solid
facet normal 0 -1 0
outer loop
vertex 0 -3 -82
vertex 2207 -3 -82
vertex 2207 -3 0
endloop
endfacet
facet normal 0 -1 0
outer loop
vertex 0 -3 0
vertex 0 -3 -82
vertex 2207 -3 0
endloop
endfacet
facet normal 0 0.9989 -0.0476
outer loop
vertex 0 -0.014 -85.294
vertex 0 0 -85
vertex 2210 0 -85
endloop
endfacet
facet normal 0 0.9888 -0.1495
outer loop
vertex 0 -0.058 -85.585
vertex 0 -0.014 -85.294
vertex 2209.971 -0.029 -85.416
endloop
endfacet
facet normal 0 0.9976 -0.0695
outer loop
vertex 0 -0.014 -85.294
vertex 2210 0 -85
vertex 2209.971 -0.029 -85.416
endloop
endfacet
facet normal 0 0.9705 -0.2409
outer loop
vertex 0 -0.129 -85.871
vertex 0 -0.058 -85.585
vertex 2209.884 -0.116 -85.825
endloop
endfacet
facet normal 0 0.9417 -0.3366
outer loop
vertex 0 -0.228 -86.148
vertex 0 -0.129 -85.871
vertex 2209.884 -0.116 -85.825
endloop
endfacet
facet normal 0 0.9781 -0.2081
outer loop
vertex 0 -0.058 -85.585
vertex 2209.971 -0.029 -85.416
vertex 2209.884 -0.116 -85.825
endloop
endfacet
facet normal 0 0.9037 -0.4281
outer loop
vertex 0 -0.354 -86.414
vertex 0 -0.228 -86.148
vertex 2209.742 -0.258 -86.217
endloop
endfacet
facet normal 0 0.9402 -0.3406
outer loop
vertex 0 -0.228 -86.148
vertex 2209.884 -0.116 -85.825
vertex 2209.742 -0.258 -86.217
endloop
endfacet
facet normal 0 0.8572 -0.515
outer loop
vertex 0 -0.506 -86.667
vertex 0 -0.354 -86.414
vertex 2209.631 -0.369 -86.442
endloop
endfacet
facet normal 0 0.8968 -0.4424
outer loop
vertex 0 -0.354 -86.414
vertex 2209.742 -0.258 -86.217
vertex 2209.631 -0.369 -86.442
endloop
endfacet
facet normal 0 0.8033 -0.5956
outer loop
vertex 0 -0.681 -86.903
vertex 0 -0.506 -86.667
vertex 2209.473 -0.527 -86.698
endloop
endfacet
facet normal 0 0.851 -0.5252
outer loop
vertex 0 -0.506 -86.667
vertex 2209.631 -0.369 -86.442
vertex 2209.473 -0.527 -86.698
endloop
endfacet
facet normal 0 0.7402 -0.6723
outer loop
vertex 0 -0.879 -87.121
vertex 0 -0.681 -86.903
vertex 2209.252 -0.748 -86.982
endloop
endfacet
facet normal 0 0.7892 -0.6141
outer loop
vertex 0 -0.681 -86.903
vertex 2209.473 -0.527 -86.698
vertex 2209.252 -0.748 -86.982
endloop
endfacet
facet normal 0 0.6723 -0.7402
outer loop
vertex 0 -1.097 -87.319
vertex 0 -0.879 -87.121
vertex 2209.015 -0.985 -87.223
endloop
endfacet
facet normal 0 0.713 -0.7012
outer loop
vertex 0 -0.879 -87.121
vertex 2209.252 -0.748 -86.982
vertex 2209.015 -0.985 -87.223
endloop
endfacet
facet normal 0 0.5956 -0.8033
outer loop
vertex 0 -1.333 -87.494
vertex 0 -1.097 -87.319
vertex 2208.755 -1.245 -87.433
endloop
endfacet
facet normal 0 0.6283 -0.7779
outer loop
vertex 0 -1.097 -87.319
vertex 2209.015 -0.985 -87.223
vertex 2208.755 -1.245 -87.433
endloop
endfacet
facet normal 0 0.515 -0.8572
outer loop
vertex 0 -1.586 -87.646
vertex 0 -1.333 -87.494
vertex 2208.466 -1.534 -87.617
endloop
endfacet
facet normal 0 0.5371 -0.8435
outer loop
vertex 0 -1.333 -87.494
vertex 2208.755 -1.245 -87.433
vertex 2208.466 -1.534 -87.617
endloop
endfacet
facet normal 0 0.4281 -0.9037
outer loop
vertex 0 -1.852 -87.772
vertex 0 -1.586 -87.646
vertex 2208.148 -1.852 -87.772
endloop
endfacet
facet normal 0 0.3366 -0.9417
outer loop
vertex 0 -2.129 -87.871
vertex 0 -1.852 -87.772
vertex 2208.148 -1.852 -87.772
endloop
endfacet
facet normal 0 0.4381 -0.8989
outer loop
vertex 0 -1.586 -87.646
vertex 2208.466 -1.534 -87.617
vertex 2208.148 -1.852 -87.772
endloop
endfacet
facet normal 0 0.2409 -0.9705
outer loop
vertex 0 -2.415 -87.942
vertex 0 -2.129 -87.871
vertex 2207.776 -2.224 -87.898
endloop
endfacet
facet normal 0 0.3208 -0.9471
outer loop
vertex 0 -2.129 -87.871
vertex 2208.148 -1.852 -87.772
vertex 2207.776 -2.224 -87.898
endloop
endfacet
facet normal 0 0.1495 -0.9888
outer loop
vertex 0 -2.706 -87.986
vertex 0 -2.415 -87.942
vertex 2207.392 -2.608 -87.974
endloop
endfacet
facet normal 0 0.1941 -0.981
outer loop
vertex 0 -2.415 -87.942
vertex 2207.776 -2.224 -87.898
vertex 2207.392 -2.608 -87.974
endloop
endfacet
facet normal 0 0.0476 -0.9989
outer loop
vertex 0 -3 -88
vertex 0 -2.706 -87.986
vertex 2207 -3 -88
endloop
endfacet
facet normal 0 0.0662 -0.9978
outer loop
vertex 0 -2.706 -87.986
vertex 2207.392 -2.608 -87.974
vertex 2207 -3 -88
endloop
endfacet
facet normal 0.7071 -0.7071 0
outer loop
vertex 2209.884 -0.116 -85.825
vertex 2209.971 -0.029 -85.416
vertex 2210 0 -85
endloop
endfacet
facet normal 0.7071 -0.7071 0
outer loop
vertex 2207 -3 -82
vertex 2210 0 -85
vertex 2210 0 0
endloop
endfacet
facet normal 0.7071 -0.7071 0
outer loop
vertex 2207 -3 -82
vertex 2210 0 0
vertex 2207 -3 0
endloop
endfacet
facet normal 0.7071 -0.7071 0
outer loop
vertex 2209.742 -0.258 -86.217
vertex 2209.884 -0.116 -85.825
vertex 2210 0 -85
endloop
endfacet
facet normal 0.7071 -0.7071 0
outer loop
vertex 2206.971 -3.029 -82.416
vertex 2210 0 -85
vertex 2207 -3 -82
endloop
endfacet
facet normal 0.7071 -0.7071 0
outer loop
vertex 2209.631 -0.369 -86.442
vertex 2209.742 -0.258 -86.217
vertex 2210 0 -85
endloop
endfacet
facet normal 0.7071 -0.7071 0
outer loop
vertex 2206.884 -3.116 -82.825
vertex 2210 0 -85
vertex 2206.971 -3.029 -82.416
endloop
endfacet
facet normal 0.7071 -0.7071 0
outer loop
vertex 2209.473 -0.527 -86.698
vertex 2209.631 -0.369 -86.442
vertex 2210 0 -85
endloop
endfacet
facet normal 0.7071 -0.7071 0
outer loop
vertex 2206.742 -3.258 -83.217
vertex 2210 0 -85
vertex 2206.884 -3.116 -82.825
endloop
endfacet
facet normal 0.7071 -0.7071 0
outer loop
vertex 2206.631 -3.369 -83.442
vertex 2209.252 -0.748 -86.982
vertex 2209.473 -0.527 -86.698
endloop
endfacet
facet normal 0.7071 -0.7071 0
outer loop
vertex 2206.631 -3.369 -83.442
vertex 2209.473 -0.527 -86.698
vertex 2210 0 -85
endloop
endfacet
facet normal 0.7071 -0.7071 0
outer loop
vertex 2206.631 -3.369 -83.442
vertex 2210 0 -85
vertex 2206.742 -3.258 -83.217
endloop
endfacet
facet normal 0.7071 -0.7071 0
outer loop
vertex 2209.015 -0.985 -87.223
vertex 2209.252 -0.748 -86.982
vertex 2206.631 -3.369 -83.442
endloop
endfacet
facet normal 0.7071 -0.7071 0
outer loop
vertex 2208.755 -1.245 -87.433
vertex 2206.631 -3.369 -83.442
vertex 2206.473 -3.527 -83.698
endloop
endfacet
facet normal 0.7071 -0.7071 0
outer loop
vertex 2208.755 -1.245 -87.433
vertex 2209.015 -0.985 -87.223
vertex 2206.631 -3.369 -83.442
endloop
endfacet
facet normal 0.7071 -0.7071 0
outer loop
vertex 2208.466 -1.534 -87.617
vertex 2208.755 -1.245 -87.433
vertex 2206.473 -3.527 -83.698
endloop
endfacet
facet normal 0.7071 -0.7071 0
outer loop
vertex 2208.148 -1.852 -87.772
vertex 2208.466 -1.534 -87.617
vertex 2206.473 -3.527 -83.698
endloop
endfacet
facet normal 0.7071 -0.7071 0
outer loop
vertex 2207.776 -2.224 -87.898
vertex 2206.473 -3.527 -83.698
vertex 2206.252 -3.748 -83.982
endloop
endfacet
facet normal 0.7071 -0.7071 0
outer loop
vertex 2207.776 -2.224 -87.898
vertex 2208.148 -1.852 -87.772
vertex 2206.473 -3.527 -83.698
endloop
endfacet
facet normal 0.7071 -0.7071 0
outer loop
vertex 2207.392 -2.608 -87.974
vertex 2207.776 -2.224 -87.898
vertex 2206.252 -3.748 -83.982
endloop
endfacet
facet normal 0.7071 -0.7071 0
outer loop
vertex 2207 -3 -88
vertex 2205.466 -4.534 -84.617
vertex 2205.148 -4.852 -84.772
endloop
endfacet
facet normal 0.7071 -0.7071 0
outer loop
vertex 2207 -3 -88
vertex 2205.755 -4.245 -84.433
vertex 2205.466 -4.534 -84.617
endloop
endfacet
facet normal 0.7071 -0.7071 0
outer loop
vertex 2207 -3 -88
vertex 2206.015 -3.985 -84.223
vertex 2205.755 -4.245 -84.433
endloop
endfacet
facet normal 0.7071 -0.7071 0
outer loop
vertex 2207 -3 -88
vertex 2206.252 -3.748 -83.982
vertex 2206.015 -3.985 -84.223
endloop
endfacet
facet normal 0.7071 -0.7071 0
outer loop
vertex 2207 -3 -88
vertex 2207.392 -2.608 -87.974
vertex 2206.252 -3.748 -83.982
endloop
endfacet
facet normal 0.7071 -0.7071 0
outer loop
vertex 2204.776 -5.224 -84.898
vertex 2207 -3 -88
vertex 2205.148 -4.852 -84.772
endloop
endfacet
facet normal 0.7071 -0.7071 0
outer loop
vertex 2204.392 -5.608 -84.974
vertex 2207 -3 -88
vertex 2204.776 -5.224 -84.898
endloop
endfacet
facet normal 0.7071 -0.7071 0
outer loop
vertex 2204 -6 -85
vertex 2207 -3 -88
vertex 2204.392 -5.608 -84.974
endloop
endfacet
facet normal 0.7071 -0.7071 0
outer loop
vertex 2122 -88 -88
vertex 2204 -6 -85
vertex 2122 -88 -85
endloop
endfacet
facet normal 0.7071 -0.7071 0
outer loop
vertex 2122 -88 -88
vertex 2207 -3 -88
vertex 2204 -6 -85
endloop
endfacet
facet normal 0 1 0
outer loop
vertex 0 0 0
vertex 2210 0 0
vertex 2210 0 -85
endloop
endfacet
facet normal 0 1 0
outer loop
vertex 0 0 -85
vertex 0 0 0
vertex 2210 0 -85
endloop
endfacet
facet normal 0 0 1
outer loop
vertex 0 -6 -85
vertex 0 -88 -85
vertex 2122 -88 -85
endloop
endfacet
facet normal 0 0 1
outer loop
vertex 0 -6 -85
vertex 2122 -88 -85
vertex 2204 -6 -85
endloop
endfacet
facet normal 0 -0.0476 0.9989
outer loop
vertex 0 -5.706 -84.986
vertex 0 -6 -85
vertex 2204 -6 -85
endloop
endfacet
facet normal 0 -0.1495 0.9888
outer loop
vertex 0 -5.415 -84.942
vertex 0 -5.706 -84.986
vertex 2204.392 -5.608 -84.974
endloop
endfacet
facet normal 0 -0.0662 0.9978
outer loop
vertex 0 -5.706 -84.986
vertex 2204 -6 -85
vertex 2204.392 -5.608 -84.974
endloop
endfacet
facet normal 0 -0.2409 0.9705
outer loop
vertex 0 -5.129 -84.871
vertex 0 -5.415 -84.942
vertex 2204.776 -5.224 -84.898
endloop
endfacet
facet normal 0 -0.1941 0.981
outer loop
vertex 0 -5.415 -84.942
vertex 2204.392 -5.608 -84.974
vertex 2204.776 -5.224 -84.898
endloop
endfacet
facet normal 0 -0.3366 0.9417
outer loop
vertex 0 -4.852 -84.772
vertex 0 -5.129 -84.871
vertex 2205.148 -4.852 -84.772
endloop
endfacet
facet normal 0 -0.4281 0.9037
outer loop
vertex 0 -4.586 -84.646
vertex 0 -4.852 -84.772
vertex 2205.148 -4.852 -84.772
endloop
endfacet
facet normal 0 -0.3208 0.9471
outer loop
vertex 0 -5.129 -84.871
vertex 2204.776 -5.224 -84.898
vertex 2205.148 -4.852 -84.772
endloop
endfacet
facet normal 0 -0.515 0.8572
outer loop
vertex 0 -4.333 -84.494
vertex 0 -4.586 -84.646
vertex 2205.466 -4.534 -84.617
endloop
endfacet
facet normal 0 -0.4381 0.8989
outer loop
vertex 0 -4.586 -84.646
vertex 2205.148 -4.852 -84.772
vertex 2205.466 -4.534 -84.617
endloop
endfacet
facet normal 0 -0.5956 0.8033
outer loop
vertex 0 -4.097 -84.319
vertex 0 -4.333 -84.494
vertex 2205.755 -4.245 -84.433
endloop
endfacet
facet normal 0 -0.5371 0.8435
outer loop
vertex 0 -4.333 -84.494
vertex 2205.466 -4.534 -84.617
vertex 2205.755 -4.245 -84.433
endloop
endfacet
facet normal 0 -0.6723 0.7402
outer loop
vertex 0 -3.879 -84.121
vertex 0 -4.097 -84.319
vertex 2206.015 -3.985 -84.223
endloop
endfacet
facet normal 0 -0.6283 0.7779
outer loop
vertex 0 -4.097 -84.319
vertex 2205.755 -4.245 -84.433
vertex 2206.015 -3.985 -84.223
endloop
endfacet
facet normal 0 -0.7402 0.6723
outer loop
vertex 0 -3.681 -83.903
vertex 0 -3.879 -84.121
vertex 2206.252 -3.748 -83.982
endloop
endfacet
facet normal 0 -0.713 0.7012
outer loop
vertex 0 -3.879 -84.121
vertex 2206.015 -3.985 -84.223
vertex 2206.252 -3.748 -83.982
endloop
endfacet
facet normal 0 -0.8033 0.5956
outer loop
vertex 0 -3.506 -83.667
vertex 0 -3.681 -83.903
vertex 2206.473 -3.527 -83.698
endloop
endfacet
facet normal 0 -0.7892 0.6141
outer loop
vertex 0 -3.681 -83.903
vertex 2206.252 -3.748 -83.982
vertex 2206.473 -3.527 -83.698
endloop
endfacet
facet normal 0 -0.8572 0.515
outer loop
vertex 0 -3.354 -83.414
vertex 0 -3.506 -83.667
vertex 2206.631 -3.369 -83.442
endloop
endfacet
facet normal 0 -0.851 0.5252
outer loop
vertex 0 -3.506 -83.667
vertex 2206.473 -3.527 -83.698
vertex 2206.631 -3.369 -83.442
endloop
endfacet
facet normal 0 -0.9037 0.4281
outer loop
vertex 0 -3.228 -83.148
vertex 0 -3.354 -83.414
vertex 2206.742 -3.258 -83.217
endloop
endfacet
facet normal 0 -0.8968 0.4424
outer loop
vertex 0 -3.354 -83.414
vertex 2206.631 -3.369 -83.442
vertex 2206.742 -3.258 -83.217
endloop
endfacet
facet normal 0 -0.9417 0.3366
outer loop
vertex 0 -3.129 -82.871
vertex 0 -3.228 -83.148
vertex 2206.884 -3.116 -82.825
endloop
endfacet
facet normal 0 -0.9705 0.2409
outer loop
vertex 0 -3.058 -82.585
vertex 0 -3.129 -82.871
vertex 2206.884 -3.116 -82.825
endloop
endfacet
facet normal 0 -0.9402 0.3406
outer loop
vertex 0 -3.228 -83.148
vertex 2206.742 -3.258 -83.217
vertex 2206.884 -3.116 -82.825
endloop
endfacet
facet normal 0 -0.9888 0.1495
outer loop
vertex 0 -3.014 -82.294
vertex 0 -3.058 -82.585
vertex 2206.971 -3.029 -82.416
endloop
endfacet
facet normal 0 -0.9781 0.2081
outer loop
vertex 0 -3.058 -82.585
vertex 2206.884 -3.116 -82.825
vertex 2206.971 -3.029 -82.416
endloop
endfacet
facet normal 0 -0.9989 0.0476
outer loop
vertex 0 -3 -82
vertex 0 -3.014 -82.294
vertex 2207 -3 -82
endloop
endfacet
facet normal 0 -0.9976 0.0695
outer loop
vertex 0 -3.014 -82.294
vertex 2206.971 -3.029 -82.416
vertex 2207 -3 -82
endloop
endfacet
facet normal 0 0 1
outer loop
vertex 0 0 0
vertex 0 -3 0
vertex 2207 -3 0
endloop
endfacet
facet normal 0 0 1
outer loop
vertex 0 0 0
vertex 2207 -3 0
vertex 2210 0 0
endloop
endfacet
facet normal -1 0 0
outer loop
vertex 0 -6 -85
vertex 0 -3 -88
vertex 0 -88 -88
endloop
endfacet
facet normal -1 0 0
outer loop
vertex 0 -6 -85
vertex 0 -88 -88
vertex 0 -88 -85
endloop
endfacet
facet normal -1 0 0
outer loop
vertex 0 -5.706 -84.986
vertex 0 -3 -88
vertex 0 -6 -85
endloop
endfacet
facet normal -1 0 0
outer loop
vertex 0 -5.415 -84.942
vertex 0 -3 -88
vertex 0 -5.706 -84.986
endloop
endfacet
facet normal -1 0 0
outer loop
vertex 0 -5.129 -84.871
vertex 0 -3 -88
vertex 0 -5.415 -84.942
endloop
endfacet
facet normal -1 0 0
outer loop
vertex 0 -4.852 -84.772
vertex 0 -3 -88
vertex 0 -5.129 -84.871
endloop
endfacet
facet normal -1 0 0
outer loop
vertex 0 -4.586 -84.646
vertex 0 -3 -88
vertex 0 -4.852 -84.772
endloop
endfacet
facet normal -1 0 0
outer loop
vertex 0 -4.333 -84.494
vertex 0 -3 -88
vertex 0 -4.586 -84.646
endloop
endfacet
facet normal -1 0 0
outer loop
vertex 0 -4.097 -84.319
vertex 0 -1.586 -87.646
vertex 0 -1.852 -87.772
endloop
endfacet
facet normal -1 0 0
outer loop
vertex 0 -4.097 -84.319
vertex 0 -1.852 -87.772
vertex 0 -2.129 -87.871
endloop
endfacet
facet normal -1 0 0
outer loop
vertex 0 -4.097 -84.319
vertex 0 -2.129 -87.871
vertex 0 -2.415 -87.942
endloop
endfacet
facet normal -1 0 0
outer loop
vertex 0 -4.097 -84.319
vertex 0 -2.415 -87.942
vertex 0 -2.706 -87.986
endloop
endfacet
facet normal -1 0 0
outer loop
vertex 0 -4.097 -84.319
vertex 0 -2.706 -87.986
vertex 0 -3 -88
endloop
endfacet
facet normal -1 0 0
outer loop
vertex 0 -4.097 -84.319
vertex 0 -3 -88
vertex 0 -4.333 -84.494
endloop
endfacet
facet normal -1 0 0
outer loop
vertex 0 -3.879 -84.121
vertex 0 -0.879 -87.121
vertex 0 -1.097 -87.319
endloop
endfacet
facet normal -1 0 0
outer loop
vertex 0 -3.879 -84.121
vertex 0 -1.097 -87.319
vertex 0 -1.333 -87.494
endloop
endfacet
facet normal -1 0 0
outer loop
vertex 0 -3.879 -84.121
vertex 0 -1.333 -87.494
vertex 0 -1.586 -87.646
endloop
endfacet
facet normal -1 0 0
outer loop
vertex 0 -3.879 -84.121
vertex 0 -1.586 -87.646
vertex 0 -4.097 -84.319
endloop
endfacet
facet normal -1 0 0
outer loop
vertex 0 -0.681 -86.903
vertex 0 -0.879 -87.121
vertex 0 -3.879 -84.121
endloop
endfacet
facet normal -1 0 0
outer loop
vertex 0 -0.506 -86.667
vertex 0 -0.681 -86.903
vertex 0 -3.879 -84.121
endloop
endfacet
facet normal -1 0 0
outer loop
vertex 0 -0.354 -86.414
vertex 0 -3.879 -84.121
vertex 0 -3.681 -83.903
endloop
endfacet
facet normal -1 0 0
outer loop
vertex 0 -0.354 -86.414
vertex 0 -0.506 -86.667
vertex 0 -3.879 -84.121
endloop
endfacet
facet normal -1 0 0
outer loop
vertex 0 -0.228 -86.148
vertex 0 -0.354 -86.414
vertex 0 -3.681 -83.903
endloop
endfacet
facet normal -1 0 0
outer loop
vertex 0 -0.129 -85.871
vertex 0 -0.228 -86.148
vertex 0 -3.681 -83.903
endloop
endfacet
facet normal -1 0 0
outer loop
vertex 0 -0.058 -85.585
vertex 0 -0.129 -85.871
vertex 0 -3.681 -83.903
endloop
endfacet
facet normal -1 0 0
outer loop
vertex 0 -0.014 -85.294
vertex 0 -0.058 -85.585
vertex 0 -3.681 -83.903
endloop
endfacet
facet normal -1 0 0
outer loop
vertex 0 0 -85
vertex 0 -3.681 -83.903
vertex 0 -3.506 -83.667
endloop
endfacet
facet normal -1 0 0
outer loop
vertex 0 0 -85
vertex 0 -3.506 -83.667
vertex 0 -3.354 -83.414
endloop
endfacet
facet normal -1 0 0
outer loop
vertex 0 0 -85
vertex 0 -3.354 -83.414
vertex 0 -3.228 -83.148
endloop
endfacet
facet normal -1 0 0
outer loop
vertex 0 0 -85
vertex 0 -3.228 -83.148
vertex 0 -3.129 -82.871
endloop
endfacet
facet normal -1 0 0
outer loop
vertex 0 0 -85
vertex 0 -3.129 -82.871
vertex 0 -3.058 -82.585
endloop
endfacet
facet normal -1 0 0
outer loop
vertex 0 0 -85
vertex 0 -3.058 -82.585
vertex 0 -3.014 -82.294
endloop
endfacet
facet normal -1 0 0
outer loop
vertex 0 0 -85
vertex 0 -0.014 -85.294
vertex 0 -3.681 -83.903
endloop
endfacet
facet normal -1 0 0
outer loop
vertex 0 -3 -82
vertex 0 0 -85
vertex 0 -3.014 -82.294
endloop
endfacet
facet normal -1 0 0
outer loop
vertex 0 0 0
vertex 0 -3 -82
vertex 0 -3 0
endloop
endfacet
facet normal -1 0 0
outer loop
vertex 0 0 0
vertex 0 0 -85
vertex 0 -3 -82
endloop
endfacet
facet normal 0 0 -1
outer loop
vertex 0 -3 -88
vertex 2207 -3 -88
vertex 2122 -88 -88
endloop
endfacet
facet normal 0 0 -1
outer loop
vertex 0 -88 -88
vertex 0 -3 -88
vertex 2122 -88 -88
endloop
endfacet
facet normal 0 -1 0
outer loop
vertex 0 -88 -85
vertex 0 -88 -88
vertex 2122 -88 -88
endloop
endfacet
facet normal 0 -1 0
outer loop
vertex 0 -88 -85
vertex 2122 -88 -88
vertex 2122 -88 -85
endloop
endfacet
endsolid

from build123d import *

# Parameters (mm, degrees)
BOSS_EXTRUDE1_DEPTH = 2210
FILLET1_R           = 3
CUT_EXTRUDE1_DEPTH  = 88


with BuildPart() as part:
    # Sketch1 → Boss-Extrude1 (new body)
    with BuildSketch(Plane(origin=(0, 0, 0), x_dir=(0, 0, -1), z_dir=(1, 0, 0))):
        Polygon((0, 0), (88, 0), (88, -88), (85, -88), (85, -3), (0, -3), align=None)
    extrude(amount=BOSS_EXTRUDE1_DEPTH)

    # Fillet1
    fillet1_edges = [part.edges().sort_by_distance(p)[0] for p in [
        (1105, 0, -88),
        (1105, -3, -85),
    ]]
    fillet(fillet1_edges, radius=FILLET1_R)

    # Sketch2 → Cut-Extrude1 (cut)
    with BuildSketch(Plane(origin=(0, 0, -88), x_dir=(-1, 0, 0), z_dir=(0, 0, -1))):
        Polygon((-2210, 0), (-2122, -88), (-2210, -88), align=None)
    extrude(amount=-CUT_EXTRUDE1_DEPTH, mode=Mode.SUBTRACT)


solid = part.part
